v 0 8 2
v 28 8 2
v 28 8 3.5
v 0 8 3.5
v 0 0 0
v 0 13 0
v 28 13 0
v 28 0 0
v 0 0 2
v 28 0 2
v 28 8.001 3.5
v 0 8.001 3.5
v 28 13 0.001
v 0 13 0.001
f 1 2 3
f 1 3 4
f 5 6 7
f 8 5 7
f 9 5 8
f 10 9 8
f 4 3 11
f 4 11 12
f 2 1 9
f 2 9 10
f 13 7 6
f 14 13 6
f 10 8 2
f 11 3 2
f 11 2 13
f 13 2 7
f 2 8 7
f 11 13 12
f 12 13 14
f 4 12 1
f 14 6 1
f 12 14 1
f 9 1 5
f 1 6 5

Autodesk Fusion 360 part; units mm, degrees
sketch "Esquisse1" plane through (0, 0, 0) normal (0, 0, 1) x (1, 0, 0)
  line L0 (0, 0) -> (28, 0)
  line L1 (28, 0) -> (28, 13)
  line L2 (28, 13) -> (0, 13)
  line L3 (0, 13) -> (0, 0)
  dimension "d1" = 28
  dimension "d2" = 13
extrude "Extrusion1" add sketch "Esquisse1" along normal blind 2
sketch "Esquisse2" plane through (0, 0, 2) normal (0, 0, 1) x (-1, 0, 0)
  line L0 (0, -13) -> (0, 0)
  line L1 (0, 0) -> (-28, 0)
  line L2 (-28, 0) -> (-28, -13)
  line L3 (-28, -13) -> (0, -13)
  line L4 (0, -13) -> (-28, -13)
  line L5 (-28, -13) -> (-28, -8)
  line L6 (-28, -8) -> (0, -8)
  line L7 (0, -8) -> (0, -13)
  dimension "d5" = 5
extrude "Extrusion2" add sketch "Esquisse2" along normal blind 1.5 contours L0 L2 L3 L4 L5 L6 L7
chamfer "Chanfrein1" distance 5 distance2 3.5 1 edges at (14, 13, 3.5) measured on face at (9.3333, 11.3333, 3.5)
